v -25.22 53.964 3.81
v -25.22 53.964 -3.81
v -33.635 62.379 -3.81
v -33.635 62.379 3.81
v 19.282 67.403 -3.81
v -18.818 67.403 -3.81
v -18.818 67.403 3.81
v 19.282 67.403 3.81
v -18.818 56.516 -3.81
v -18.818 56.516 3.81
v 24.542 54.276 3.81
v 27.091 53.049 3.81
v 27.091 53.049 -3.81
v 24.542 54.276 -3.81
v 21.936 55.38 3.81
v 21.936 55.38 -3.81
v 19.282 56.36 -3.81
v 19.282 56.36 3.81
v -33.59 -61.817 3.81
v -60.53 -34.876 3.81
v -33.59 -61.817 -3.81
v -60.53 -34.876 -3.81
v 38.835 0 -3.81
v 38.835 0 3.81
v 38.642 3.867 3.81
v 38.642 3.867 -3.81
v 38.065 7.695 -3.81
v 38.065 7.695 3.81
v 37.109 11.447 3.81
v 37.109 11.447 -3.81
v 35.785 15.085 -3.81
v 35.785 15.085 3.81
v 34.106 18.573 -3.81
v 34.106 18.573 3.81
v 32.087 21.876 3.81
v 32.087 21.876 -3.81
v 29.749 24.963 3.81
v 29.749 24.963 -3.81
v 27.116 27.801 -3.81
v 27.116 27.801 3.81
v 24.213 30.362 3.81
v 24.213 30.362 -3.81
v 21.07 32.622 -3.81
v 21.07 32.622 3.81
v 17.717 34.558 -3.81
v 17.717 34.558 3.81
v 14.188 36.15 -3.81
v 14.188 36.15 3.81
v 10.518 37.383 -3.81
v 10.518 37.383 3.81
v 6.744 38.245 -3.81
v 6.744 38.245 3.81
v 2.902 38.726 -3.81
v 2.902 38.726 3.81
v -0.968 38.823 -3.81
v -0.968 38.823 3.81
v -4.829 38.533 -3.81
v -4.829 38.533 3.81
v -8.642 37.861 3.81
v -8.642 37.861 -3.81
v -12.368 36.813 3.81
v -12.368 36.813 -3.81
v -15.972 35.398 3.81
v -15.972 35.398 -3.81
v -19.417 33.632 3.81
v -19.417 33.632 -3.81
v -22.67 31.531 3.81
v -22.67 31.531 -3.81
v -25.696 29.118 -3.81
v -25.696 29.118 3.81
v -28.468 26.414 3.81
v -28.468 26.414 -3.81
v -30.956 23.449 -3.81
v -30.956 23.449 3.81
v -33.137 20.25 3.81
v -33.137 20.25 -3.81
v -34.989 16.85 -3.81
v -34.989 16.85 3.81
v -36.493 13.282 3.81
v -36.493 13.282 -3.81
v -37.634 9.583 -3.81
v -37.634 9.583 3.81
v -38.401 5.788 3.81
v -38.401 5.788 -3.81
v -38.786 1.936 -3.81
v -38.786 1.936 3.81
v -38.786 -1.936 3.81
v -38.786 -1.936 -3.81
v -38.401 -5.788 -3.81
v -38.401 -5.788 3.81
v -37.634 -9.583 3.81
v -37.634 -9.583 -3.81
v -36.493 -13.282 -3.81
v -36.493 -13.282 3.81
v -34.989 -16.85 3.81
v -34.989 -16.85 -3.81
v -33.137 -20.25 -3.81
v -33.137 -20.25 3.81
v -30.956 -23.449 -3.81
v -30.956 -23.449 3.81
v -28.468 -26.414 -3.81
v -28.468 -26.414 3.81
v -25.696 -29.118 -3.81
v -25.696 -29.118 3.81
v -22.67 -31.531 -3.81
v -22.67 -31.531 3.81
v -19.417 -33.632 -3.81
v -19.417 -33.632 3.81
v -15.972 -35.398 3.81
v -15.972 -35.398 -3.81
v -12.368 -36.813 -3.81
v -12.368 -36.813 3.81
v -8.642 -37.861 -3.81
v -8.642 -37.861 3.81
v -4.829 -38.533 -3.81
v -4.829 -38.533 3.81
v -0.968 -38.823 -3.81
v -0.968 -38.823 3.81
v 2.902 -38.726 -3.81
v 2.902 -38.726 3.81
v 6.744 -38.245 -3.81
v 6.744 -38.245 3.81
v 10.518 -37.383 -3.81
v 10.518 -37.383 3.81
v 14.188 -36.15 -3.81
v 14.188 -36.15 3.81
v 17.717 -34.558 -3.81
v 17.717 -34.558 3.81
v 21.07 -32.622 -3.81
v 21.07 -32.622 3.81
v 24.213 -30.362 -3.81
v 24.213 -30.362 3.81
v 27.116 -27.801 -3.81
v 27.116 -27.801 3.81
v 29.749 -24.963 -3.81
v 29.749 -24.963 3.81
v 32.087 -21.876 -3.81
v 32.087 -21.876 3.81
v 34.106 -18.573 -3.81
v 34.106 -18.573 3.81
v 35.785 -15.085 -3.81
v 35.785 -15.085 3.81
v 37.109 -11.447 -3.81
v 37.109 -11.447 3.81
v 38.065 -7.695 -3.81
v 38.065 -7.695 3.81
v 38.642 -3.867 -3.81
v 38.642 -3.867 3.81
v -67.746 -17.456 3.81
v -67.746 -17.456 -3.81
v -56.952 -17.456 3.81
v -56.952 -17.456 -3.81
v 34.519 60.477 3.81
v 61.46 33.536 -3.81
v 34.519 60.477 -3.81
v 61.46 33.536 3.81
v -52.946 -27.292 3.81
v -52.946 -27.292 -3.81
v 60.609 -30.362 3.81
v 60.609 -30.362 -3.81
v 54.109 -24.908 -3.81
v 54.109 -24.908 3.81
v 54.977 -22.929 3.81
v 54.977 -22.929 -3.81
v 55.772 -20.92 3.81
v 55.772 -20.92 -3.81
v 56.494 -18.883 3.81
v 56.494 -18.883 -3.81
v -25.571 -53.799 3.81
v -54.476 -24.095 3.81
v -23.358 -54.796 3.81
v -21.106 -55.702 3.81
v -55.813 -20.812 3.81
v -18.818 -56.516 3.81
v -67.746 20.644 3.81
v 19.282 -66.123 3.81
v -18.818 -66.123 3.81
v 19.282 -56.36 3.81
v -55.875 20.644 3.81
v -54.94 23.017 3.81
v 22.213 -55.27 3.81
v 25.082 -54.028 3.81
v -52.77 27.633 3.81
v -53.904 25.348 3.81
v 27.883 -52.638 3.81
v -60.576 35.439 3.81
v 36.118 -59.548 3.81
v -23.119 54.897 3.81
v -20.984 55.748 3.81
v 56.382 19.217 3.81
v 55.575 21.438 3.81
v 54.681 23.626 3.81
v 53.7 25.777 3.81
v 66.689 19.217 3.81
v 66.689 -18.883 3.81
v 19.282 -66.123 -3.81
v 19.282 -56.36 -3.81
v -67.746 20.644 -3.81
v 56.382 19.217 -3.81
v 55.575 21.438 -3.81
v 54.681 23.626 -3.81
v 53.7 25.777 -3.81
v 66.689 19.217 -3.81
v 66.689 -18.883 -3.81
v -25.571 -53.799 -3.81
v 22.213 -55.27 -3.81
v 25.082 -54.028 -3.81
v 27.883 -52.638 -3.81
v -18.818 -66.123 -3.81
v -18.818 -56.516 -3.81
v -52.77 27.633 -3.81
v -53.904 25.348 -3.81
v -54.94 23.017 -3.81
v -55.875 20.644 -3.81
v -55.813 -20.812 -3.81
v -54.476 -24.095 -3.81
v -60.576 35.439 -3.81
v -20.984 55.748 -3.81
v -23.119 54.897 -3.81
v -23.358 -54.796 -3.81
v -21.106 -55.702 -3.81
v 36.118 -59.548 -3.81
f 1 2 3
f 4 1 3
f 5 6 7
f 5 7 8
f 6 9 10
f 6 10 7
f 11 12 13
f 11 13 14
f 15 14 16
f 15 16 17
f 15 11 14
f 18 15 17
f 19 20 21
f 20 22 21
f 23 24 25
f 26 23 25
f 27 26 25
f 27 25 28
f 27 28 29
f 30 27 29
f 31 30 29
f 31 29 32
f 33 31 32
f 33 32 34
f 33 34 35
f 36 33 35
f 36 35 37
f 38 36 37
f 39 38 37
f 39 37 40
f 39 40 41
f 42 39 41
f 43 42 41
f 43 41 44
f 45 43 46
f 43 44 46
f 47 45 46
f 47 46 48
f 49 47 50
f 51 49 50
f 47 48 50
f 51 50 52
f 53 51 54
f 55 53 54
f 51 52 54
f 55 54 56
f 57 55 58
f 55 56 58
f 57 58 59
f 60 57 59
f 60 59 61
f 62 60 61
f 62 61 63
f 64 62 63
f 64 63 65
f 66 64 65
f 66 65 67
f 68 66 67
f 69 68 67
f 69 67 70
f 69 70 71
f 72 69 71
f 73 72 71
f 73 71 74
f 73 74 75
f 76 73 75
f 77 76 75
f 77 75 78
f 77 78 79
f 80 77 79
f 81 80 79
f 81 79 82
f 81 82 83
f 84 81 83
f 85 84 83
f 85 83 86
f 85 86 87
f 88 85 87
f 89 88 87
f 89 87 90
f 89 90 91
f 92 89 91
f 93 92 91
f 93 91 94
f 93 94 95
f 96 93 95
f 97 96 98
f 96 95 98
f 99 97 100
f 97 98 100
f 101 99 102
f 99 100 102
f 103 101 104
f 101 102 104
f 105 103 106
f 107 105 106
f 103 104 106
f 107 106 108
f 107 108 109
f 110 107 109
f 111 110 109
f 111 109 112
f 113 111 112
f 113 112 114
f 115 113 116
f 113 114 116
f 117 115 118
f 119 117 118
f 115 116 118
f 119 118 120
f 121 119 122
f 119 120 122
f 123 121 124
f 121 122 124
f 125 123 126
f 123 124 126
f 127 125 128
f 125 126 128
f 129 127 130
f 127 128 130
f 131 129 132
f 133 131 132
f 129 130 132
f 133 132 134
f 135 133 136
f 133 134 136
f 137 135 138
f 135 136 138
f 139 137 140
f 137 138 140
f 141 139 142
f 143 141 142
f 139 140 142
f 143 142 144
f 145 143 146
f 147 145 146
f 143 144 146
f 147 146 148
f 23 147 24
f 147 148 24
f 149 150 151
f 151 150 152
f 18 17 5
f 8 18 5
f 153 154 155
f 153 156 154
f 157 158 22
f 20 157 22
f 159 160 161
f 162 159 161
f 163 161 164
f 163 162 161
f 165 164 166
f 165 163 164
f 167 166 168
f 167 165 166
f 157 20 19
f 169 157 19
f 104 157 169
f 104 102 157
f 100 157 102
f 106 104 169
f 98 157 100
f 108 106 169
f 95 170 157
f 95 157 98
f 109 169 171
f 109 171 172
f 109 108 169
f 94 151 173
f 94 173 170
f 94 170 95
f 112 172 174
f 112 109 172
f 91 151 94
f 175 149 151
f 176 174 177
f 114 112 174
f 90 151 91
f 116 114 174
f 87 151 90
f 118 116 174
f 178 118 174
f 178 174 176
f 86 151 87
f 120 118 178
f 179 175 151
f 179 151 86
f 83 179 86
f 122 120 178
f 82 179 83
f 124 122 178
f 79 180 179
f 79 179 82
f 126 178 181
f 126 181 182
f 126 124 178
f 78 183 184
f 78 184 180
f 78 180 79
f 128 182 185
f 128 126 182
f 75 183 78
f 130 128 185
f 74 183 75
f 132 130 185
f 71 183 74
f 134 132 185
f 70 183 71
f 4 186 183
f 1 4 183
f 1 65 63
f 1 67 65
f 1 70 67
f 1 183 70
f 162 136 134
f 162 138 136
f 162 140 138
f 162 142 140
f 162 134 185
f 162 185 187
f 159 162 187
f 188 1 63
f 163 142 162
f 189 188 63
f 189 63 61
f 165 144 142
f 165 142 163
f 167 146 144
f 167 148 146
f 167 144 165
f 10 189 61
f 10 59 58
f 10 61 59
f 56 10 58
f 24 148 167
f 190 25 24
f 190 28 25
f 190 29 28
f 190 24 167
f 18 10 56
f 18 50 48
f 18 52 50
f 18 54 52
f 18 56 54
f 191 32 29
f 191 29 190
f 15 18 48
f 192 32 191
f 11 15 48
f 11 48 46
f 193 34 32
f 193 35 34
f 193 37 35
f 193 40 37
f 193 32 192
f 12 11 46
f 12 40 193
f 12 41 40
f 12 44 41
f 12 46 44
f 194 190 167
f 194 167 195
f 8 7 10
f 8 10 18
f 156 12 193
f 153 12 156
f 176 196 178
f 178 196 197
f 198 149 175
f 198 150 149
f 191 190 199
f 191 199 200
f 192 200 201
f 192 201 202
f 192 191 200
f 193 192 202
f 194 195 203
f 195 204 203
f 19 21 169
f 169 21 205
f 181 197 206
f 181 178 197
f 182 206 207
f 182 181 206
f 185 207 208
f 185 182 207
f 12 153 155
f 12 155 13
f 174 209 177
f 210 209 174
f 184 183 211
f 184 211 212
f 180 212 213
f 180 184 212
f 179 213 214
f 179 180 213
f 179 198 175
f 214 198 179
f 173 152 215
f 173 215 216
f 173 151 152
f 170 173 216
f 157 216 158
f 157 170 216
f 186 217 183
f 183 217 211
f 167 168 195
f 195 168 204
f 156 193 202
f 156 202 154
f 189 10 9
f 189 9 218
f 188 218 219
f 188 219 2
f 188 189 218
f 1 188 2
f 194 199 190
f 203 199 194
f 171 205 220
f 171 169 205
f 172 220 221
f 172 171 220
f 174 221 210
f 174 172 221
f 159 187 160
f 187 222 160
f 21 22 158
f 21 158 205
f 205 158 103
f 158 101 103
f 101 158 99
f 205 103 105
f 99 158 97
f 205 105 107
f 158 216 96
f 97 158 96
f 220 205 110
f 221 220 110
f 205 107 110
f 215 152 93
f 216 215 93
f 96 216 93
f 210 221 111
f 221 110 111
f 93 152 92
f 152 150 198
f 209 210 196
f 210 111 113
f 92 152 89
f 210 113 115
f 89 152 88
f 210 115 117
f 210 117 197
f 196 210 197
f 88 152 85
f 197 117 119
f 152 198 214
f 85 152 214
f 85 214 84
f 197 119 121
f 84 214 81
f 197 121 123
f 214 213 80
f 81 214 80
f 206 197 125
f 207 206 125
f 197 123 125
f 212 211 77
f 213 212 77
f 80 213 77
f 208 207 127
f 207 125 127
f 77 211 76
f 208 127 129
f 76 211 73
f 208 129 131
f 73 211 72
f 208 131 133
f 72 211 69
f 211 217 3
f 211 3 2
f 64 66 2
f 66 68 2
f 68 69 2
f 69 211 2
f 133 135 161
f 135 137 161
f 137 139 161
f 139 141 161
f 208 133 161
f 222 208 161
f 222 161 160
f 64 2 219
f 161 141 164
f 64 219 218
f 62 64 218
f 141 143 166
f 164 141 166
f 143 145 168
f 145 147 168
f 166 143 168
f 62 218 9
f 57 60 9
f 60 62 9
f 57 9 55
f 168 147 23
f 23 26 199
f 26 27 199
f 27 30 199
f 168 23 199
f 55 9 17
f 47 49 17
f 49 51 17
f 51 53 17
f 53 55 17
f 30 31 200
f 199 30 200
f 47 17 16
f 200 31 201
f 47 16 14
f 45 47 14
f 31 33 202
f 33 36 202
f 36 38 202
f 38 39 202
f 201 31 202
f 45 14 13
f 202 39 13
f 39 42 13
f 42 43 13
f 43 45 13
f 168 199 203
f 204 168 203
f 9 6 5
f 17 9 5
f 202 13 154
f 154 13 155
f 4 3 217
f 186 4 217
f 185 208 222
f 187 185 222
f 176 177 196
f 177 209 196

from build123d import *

# Parameters (mm, degrees)
F0_R     = 59.56666
F1_DEPTH = 3.81
F2_R     = 38.83477
F3_DEPTH = 25.4
F4_W     = 12.7
F4_H     = 38.1
F4_W_2   = 38.1
F4_H_2   = 12.7
F5_DEPTH = 3.81


with BuildPart() as f1:
    # F0 (on Top) → F1 (new body, symmetric)
    with BuildSketch(Plane.XY):
        Circle(F0_R)
    extrude(amount=F1_DEPTH, both=True)

    # F2 (on face) → F3 (cut)
    with BuildSketch(Plane.XY.offset(3.81)):
        Circle(F2_R)
    extrude(amount=-F3_DEPTH, mode=Mode.SUBTRACT)

    # F4 (on Top) → F5 (join, symmetric)
    with BuildSketch(Plane.XY):
        Polygon((-51.550063, -25.89613), (-60.530319, -34.876386), (-33.589551, -61.817154), (-24.609294, -52.836898), align=None)
        Polygon((26.389541, -51.384653), (36.118306, -59.548056), (60.608514, -30.361762), (50.879749, -22.19836), align=None)
        with Locations((60.338904, 0.166861)):
            Rectangle(F4_W, F4_H)
        with Locations((0.23175, -59.773433)):
            Rectangle(F4_W_2, F4_H_2)
        with Locations((-61.395693, 1.594452)):
            Rectangle(F4_W, F4_H)
        Polygon((-60.575688, 35.438669), (-51.595432, 26.458413), (-24.654663, 53.399182), (-33.63492, 62.379438), align=None)
        with Locations((0.23175, 61.052699)):
            Rectangle(F4_W_2, F4_H_2)
        Polygon((34.518826, 60.477025), (25.53857, 51.496769), (52.479338, 24.556001), (61.459594, 33.536257), align=None)
    extrude(amount=F5_DEPTH, both=True)


solid = f1.part
